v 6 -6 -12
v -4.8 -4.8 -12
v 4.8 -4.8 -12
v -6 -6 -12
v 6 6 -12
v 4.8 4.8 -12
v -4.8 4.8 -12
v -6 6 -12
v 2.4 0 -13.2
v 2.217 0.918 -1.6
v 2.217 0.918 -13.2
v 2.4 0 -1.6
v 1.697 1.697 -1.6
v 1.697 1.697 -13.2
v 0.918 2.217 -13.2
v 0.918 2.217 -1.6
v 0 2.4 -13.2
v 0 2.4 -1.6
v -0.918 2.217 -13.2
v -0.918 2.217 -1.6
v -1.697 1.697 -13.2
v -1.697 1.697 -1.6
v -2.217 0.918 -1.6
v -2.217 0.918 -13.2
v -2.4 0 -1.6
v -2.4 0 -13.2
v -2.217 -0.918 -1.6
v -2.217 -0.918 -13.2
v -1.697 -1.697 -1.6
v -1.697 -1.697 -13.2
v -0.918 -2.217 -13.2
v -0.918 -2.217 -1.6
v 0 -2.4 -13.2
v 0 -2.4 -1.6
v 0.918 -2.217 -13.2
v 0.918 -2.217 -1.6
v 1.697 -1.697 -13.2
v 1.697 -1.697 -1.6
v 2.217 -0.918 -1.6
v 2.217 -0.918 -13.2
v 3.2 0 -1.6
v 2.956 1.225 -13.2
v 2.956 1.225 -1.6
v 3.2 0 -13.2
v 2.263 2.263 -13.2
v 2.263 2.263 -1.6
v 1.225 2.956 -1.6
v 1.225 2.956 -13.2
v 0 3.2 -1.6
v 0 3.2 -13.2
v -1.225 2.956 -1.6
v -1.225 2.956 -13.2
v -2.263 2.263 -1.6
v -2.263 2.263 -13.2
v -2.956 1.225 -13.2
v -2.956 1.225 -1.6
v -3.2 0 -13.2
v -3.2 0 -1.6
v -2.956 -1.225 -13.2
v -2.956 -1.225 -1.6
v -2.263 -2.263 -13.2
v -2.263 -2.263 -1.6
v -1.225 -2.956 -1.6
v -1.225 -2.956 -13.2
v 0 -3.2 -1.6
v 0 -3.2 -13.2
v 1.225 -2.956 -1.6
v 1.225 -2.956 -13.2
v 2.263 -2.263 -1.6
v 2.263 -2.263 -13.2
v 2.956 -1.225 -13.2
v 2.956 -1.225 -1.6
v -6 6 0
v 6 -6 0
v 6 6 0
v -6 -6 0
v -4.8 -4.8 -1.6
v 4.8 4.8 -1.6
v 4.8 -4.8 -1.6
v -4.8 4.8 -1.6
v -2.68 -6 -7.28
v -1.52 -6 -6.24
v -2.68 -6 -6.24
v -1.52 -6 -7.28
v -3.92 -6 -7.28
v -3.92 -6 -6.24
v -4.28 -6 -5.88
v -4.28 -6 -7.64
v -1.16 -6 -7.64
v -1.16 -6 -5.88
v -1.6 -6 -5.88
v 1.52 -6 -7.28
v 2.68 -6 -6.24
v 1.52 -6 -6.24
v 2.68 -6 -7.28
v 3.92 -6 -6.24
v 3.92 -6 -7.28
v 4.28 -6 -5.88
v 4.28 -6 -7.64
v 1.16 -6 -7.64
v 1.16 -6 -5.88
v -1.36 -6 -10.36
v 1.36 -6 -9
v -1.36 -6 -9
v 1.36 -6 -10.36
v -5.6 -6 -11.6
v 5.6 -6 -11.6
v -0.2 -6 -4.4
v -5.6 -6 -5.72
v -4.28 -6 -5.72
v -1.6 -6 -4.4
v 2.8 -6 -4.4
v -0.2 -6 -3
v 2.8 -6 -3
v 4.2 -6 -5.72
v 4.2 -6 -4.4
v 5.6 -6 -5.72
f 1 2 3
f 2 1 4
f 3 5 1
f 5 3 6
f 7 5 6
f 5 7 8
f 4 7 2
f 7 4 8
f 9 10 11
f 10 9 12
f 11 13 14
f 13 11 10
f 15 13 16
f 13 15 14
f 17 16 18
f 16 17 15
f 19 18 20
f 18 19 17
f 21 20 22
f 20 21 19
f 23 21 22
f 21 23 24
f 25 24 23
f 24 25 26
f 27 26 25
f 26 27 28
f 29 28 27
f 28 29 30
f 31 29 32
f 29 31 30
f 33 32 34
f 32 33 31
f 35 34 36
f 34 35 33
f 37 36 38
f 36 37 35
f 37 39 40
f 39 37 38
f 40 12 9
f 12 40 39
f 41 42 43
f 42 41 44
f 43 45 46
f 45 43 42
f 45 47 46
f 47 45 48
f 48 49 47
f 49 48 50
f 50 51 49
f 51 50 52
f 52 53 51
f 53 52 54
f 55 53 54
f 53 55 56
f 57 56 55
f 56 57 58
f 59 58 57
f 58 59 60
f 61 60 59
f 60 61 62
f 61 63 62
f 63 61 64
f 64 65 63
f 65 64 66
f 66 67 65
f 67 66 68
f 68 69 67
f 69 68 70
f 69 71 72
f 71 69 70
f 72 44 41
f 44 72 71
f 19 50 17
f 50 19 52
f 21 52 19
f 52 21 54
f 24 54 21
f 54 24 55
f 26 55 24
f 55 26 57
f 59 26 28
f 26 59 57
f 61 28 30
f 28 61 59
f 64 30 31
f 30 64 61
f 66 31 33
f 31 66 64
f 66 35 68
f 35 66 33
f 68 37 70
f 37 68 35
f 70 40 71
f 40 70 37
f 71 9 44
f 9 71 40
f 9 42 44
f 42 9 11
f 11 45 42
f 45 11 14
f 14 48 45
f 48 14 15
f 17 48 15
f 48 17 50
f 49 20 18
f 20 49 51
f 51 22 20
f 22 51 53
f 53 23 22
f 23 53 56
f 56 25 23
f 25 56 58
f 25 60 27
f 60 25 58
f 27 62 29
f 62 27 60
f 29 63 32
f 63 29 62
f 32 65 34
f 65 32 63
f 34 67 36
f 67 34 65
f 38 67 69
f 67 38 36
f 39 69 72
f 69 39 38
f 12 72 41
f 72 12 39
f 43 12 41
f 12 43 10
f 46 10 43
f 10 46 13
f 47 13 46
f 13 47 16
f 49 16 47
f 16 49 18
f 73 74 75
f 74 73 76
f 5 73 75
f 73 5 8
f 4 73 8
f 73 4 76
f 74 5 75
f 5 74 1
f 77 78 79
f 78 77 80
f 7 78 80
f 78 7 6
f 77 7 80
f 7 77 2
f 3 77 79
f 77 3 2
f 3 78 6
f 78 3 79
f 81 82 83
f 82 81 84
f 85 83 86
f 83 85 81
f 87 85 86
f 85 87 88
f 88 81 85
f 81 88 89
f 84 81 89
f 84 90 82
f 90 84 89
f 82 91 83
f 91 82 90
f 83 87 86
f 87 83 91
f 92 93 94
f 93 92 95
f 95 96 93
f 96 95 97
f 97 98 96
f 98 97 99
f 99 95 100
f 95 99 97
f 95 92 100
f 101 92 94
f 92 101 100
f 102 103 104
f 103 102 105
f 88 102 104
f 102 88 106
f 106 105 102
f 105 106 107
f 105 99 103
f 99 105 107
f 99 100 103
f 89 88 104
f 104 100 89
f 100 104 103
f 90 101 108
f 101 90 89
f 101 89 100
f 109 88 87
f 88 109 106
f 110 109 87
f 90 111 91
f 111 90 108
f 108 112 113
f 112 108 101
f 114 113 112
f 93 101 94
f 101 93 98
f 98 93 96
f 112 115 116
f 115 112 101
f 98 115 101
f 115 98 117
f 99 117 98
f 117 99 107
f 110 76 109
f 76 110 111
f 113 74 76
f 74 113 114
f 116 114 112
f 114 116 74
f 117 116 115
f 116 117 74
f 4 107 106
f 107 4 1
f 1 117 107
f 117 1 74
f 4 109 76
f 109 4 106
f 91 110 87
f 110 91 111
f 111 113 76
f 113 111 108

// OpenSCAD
// file: ../p/4-4ring3.scad
use <../lib.scad>
$fa=1; $fs=0.2;
function ldraw_lib__4_4ring3(realsolid=false) = [
// 0 Ring  3 x 1.0
// 0 Name: 4-4ring3.dat
// 0 Author: James Jessiman
// 0 !LDRAW_ORG Primitive UPDATE 2009-01
// 0 !LICENSE Licensed under CC BY 2.0 and CC BY 4.0 : see CAreadme.txt
// 
// 0 BFC CERTIFY CCW
  [0,"BFC","CERTIFY"],
  [0,"BFC","CCW"],
// 
// 0 !HISTORY 1998-12-15 [PTadmin] Official Update 1998-10
// 0 !HISTORY 2002-04-05 [hafhead] Added BFC statement
// 0 !HISTORY 2002-04-25 [PTadmin] Official Update 2002-02
// 0 !HISTORY 2007-06-24 [PTadmin] Header formatted for Contributor Agreement
// 0 !HISTORY 2008-07-01 [PTadmin] Official Update 2008-01
// 0 !HISTORY 2008-08-26 [cwdee] Switch polygon winding and rename
// 0 !HISTORY 2009-05-02 [PTadmin] Official Update 2009-01
// 
// 
// 4 16 -1.5308 0 3.6956 -1.1481 0 2.7717 0 0 3 0 0 4
  [4,16,-1.5308,0,3.6956,-1.1481,0,2.7717,0,0,3,0,0,4],
// 4 16 -2.8284 0 2.8284 -2.1213 0 2.1213 -1.1481 0 2.7717 -1.5308 0 3.6956
  [4,16,-2.8284,0,2.8284,-2.1213,0,2.1213,-1.1481,0,2.7717,-1.5308,0,3.6956],
// 4 16 -3.6956 0 1.5308 -2.7717 0 1.1481 -2.1213 0 2.1213 -2.8284 0 2.8284
  [4,16,-3.6956,0,1.5308,-2.7717,0,1.1481,-2.1213,0,2.1213,-2.8284,0,2.8284],
// 4 16 -4 0 0 -3 0 0 -2.7717 0 1.1481 -3.6956 0 1.5308
  [4,16,-4,0,0,-3,0,0,-2.7717,0,1.1481,-3.6956,0,1.5308],
// 4 16 -3.6956 0 -1.5308 -2.7717 0 -1.1481 -3 0 0 -4 0 0
  [4,16,-3.6956,0,-1.5308,-2.7717,0,-1.1481,-3,0,0,-4,0,0],
// 4 16 -2.8284 0 -2.8284 -2.1213 0 -2.1213 -2.7717 0 -1.1481 -3.6956 0 -1.5308
  [4,16,-2.8284,0,-2.8284,-2.1213,0,-2.1213,-2.7717,0,-1.1481,-3.6956,0,-1.5308],
// 4 16 -1.5308 0 -3.6956 -1.1481 0 -2.7717 -2.1213 0 -2.1213 -2.8284 0 -2.8284
  [4,16,-1.5308,0,-3.6956,-1.1481,0,-2.7717,-2.1213,0,-2.1213,-2.8284,0,-2.8284],
// 4 16 0 0 -4 0 0 -3 -1.1481 0 -2.7717 -1.5308 0 -3.6956
  [4,16,0,0,-4,0,0,-3,-1.1481,0,-2.7717,-1.5308,0,-3.6956],
// 4 16 1.5308 0 -3.6956 1.1481 0 -2.7717 0 0 -3 0 0 -4
  [4,16,1.5308,0,-3.6956,1.1481,0,-2.7717,0,0,-3,0,0,-4],
// 4 16 2.8284 0 -2.8284 2.1213 0 -2.1213 1.1481 0 -2.7717 1.5308 0 -3.6956
  [4,16,2.8284,0,-2.8284,2.1213,0,-2.1213,1.1481,0,-2.7717,1.5308,0,-3.6956],
// 4 16 3.6956 0 -1.5308 2.7717 0 -1.1481 2.1213 0 -2.1213 2.8284 0 -2.8284
  [4,16,3.6956,0,-1.5308,2.7717,0,-1.1481,2.1213,0,-2.1213,2.8284,0,-2.8284],
// 4 16 4 0 0 3 0 0 2.7717 0 -1.1481 3.6956 0 -1.5308
  [4,16,4,0,0,3,0,0,2.7717,0,-1.1481,3.6956,0,-1.5308],
// 4 16 3.6956 0 1.5308 2.7717 0 1.1481 3 0 0 4 0 0
  [4,16,3.6956,0,1.5308,2.7717,0,1.1481,3,0,0,4,0,0],
// 4 16 2.8284 0 2.8284 2.1213 0 2.1213 2.7717 0 1.1481 3.6956 0 1.5308
  [4,16,2.8284,0,2.8284,2.1213,0,2.1213,2.7717,0,1.1481,3.6956,0,1.5308],
// 4 16 1.5308 0 3.6956 1.1481 0 2.7717 2.1213 0 2.1213 2.8284 0 2.8284
  [4,16,1.5308,0,3.6956,1.1481,0,2.7717,2.1213,0,2.1213,2.8284,0,2.8284],
// 4 16 0 0 4 0 0 3 1.1481 0 2.7717 1.5308 0 3.6956
  [4,16,0,0,4,0,0,3,1.1481,0,2.7717,1.5308,0,3.6956],
// 0
];
module ldraw_lib__4_4ring3(step=0, col=false, unit=2/5, alt=false, line=0.2, solid=!$preview)
    makepoly(ldraw_lib__4_4ring3(solid), step=step, col=col, unit=unit, alt=alt, line=line, solid=solid);
ldraw_lib__4_4ring3(line=0.2);
// file: ../p/4-4edge.scad
use <../lib.scad>
function ldraw_lib__4_4edge() = [
// 0 Circle 1.0
// 0 Name: 4-4edge.dat
// 0 Author: James Jessiman
// 0 !LDRAW_ORG Primitive UPDATE 2017-01
// 0 !LICENSE Licensed under CC BY 2.0 and CC BY 4.0 : see CAreadme.txt
// 
// 0 BFC CERTIFY CCW
  [0,"BFC","CERTIFY"],
  [0,"BFC","CCW"],
// 
// 0 !HISTORY 1998-12-15 [PTadmin] Official Update 1998-10
// 0 !HISTORY 2005-12-28 [PTadmin] Official Update 2005-01
// 0 !HISTORY 2007-06-24 [PTadmin] Header formatted for Contributor Agreement
// 0 !HISTORY 2008-07-01 [PTadmin] Official Update 2008-01
// 0 !HISTORY 2017-01-15 [Steffen] BFCed
// 0 !HISTORY 2017-12-30 [PTadmin] Official Update 2017-01
// 
// 
// 2 24 1 0 0 0.9239 0 0.3827
  [2,24,1,0,0,0.9239,0,0.3827],
// 2 24 0.9239 0 0.3827 0.7071 0 0.7071
  [2,24,0.9239,0,0.3827,0.7071,0,0.7071],
// 2 24 0.7071 0 0.7071 0.3827 0 0.9239
  [2,24,0.7071,0,0.7071,0.3827,0,0.9239],
// 2 24 0.3827 0 0.9239 0 0 1
  [2,24,0.3827,0,0.9239,0,0,1],
// 2 24 0 0 1 -0.3827 0 0.9239
  [2,24,0,0,1,-0.3827,0,0.9239],
// 2 24 -0.3827 0 0.9239 -0.7071 0 0.7071
  [2,24,-0.3827,0,0.9239,-0.7071,0,0.7071],
// 2 24 -0.7071 0 0.7071 -0.9239 0 0.3827
  [2,24,-0.7071,0,0.7071,-0.9239,0,0.3827],
// 2 24 -0.9239 0 0.3827 -1 0 -0
  [2,24,-0.9239,0,0.3827,-1,0,-0],
// 2 24 -1 0 -0 -0.9239 0 -0.3827
  [2,24,-1,0,-0,-0.9239,0,-0.3827],
// 2 24 -0.9239 0 -0.3827 -0.7071 0 -0.7071
  [2,24,-0.9239,0,-0.3827,-0.7071,0,-0.7071],
// 2 24 -0.7071 0 -0.7071 -0.3827 0 -0.9239
  [2,24,-0.7071,0,-0.7071,-0.3827,0,-0.9239],
// 2 24 -0.3827 0 -0.9239 0 0 -1
  [2,24,-0.3827,0,-0.9239,0,0,-1],
// 2 24 0 0 -1 0.3827 0 -0.9239
  [2,24,0,0,-1,0.3827,0,-0.9239],
// 2 24 0.3827 0 -0.9239 0.7071 0 -0.7071
  [2,24,0.3827,0,-0.9239,0.7071,0,-0.7071],
// 2 24 0.7071 0 -0.7071 0.9239 0 -0.3827
  [2,24,0.7071,0,-0.7071,0.9239,0,-0.3827],
// 2 24 0.9239 0 -0.3827 1 0 0
  [2,24,0.9239,0,-0.3827,1,0,0],
];
module ldraw_lib__4_4edge(step=0, col=false, unit=2/5, alt=false, line=0.2, solid=!$preview)
    makepoly(ldraw_lib__4_4edge(), step=step, col=col, unit=unit, alt=alt, line=line, solid=solid);
ldraw_lib__4_4edge(line=0.2);
// file: ../p/4-4cyli.scad
use <../lib.scad>
$fa=1; $fs=0.2;
function ldraw_lib__4_4cyli(realsolid=false) = [
// 0 Cylinder 1.0
// 0 Name: 4-4cyli.dat
// 0 Author: James Jessiman
// 0 !LDRAW_ORG Primitive UPDATE 2005-01
// 0 !LICENSE Licensed under CC BY 2.0 and CC BY 4.0 : see CAreadme.txt
// 
// 0 BFC CERTIFY CCW
  [0,"BFC","CERTIFY"],
  [0,"BFC","CCW"],
// 
// 0 !HISTORY 1998-12-15 [PTadmin] Official Update 1998-10
// 0 !HISTORY 2002-03-23 [sbliss] Added BFC statement; merged headers from files in distributions LDraw 0.27 and Complete.
// 0 !HISTORY 2002-04-25 [PTadmin] Official Update 2002-02
// 0 !HISTORY 2004-12-14 [guyvivan] BFC CCW
// 0 !HISTORY 2005-12-28 [PTadmin] Official Update 2005-01
// 0 !HISTORY 2007-06-24 [PTadmin] Header formatted for Contributor Agreement
// 0 !HISTORY 2008-07-01 [PTadmin] Official Update 2008-01
// 
// 
// 4 16 1 1 0 0.9239 1 0.3827 0.9239 0 0.3827 1 0 0
  [4,16,1,1,0,0.9239,1,0.3827,0.9239,0,0.3827,1,0,0],
// 5 24 1 0 0 1 1 0 0.9239 0 0.3827 0.9239 0 -0.3827
  [5,24,1,0,0,1,1,0,0.9239,0,0.3827,0.9239,0,-0.3827],
// 4 16 0.9239 1 0.3827 0.7071 1 0.7071 0.7071 0 0.7071 0.9239 0 0.3827
  [4,16,0.9239,1,0.3827,0.7071,1,0.7071,0.7071,0,0.7071,0.9239,0,0.3827],
// 5 24 0.9239 0 0.3827 0.9239 1 0.3827 0.7071 0 0.7071 1 0 0
  [5,24,0.9239,0,0.3827,0.9239,1,0.3827,0.7071,0,0.7071,1,0,0],
// 4 16 0.7071 1 0.7071 0.3827 1 0.9239 0.3827 0 0.9239 0.7071 0 0.7071
  [4,16,0.7071,1,0.7071,0.3827,1,0.9239,0.3827,0,0.9239,0.7071,0,0.7071],
// 5 24 0.7071 0 0.7071 0.7071 1 0.7071 0.3827 0 0.9239 0.9239 0 0.3827
  [5,24,0.7071,0,0.7071,0.7071,1,0.7071,0.3827,0,0.9239,0.9239,0,0.3827],
// 4 16 0.3827 1 0.9239 0 1 1 0 0 1 0.3827 0 0.9239
  [4,16,0.3827,1,0.9239,0,1,1,0,0,1,0.3827,0,0.9239],
// 5 24 0.3827 0 0.9239 0.3827 1 0.9239 0 0 1 0.7071 0 0.7071
  [5,24,0.3827,0,0.9239,0.3827,1,0.9239,0,0,1,0.7071,0,0.7071],
// 4 16 0 1 1 -0.3827 1 0.9239 -0.3827 0 0.9239 0 0 1
  [4,16,0,1,1,-0.3827,1,0.9239,-0.3827,0,0.9239,0,0,1],
// 5 24 0 0 1 0 1 1 -0.3827 0 0.9239 0.3827 0 0.9239
  [5,24,0,0,1,0,1,1,-0.3827,0,0.9239,0.3827,0,0.9239],
// 4 16 -0.3827 1 0.9239 -0.7071 1 0.7071 -0.7071 0 0.7071 -0.3827 0 0.9239
  [4,16,-0.3827,1,0.9239,-0.7071,1,0.7071,-0.7071,0,0.7071,-0.3827,0,0.9239],
// 5 24 -0.3827 0 0.9239 -0.3827 1 0.9239 -0.7071 0 0.7071 0 0 1
  [5,24,-0.3827,0,0.9239,-0.3827,1,0.9239,-0.7071,0,0.7071,0,0,1],
// 4 16 -0.7071 1 0.7071 -0.9239 1 0.3827 -0.9239 0 0.3827 -0.7071 0 0.7071
  [4,16,-0.7071,1,0.7071,-0.9239,1,0.3827,-0.9239,0,0.3827,-0.7071,0,0.7071],
// 5 24 -0.7071 0 0.7071 -0.7071 1 0.7071 -0.9239 0 0.3827 -0.3827 0 0.9239
  [5,24,-0.7071,0,0.7071,-0.7071,1,0.7071,-0.9239,0,0.3827,-0.3827,0,0.9239],
// 4 16 -0.9239 1 0.3827 -1 1 0 -1 0 0 -0.9239 0 0.3827
  [4,16,-0.9239,1,0.3827,-1,1,0,-1,0,0,-0.9239,0,0.3827],
// 5 24 -0.9239 0 0.3827 -0.9239 1 0.3827 -1 0 0 -0.7071 0 0.7071
  [5,24,-0.9239,0,0.3827,-0.9239,1,0.3827,-1,0,0,-0.7071,0,0.7071],
// 4 16 -1 1 0 -0.9239 1 -0.3827 -0.9239 0 -0.3827 -1 0 0
  [4,16,-1,1,0,-0.9239,1,-0.3827,-0.9239,0,-0.3827,-1,0,0],
// 5 24 -1 0 0 -1 1 0 -0.9239 0 -0.3827 -0.9239 0 0.3827
  [5,24,-1,0,0,-1,1,0,-0.9239,0,-0.3827,-0.9239,0,0.3827],
// 4 16 -0.9239 1 -0.3827 -0.7071 1 -0.7071 -0.7071 0 -0.7071 -0.9239 0 -0.3827
  [4,16,-0.9239,1,-0.3827,-0.7071,1,-0.7071,-0.7071,0,-0.7071,-0.9239,0,-0.3827],
// 5 24 -0.9239 0 -0.3827 -0.9239 1 -0.3827 -0.7071 0 -0.7071 -1 0 0
  [5,24,-0.9239,0,-0.3827,-0.9239,1,-0.3827,-0.7071,0,-0.7071,-1,0,0],
// 4 16 -0.7071 1 -0.7071 -0.3827 1 -0.9239 -0.3827 0 -0.9239 -0.7071 0 -0.7071
  [4,16,-0.7071,1,-0.7071,-0.3827,1,-0.9239,-0.3827,0,-0.9239,-0.7071,0,-0.7071],
// 5 24 -0.7071 0 -0.7071 -0.7071 1 -0.7071 -0.3827 0 -0.9239 -0.9239 0 -0.3827
  [5,24,-0.7071,0,-0.7071,-0.7071,1,-0.7071,-0.3827,0,-0.9239,-0.9239,0,-0.3827],
// 4 16 -0.3827 1 -0.9239 0 1 -1 0 0 -1 -0.3827 0 -0.9239
  [4,16,-0.3827,1,-0.9239,0,1,-1,0,0,-1,-0.3827,0,-0.9239],
// 5 24 -0.3827 0 -0.9239 -0.3827 1 -0.9239 0 0 -1 -0.7071 0 -0.7071
  [5,24,-0.3827,0,-0.9239,-0.3827,1,-0.9239,0,0,-1,-0.7071,0,-0.7071],
// 4 16 0 1 -1 0.3827 1 -0.9239 0.3827 0 -0.9239 0 0 -1
  [4,16,0,1,-1,0.3827,1,-0.9239,0.3827,0,-0.9239,0,0,-1],
// 5 24 0 0 -1 0 1 -1 0.3827 0 -0.9239 -0.3827 0 -0.9239
  [5,24,0,0,-1,0,1,-1,0.3827,0,-0.9239,-0.3827,0,-0.9239],
// 4 16 0.3827 1 -0.9239 0.7071 1 -0.7071 0.7071 0 -0.7071 0.3827 0 -0.9239
  [4,16,0.3827,1,-0.9239,0.7071,1,-0.7071,0.7071,0,-0.7071,0.3827,0,-0.9239],
// 5 24 0.3827 0 -0.9239 0.3827 1 -0.9239 0.7071 0 -0.7071 0 0 -1
  [5,24,0.3827,0,-0.9239,0.3827,1,-0.9239,0.7071,0,-0.7071,0,0,-1],
// 4 16 0.7071 1 -0.7071 0.9239 1 -0.3827 0.9239 0 -0.3827 0.7071 0 -0.7071
  [4,16,0.7071,1,-0.7071,0.9239,1,-0.3827,0.9239,0,-0.3827,0.7071,0,-0.7071],
// 5 24 0.7071 0 -0.7071 0.7071 1 -0.7071 0.9239 0 -0.3827 0.3827 0 -0.9239
  [5,24,0.7071,0,-0.7071,0.7071,1,-0.7071,0.9239,0,-0.3827,0.3827,0,-0.9239],
// 4 16 0.9239 1 -0.3827 1 1 0 1 0 0 0.9239 0 -0.3827
  [4,16,0.9239,1,-0.3827,1,1,0,1,0,0,0.9239,0,-0.3827],
// 5 24 0.9239 0 -0.3827 0.9239 1 -0.3827 1 0 0 0.7071 0 -0.7071
  [5,24,0.9239,0,-0.3827,0.9239,1,-0.3827,1,0,0,0.7071,0,-0.7071],
// 0
];
module ldraw_lib__4_4cyli(step=0, col=false, unit=2/5, alt=false, line=0.2, solid=!$preview)
    makepoly(ldraw_lib__4_4cyli(solid), step=step, col=col, unit=unit, alt=alt, line=line, solid=solid);
ldraw_lib__4_4cyli(line=0.2);
// file: ../p/stud4.scad
use <../lib.scad>
use <4-4cyli.scad>
use <4-4edge.scad>
use <4-4ring3.scad>
function ldraw_lib__stud4() = [
// 0 Stud Tube Open
// 0 Name: stud4.dat
// 0 Author: James Jessiman
// 0 !LDRAW_ORG Primitive UPDATE 2009-02
// 0 !LICENSE Licensed under CC BY 4.0 : see CAreadme.txt
// 
// 0 BFC CERTIFY CCW
  [0,"BFC","CERTIFY"],
  [0,"BFC","CCW"],
// 
// 0 !HISTORY 1999-07-05 [PTadmin] Official Update 1999-05
// 0 !HISTORY 2002-04-04 [sbliss] Modified for BFC compliance
// 0 !HISTORY 2002-04-25 [PTadmin] Official Update 2002-02
// 0 !HISTORY 2007-06-24 [PTadmin] Header formatted for Contributor Agreement
// 0 !HISTORY 2008-07-01 [PTadmin] Official Update 2008-01
// 0 !HISTORY 2009-06-21 [cwdee] Update ring references to 4-4ring
// 0 !HISTORY 2009-09-03 [PTadmin] Official Update 2009-02
// 
// 
// 1 16 0 -4 0 6 0 0 0 1 0 0 0 6 4-4edge.dat
  [1,16,0,-4,0,6,0,0,0,1,0,0,0,6, ldraw_lib__4_4edge()],
// 1 16 0 -4 0 8 0 0 0 1 0 0 0 8 4-4edge.dat
  [1,16,0,-4,0,8,0,0,0,1,0,0,0,8, ldraw_lib__4_4edge()],
// 1 16 0 0 0 6 0 0 0 1 0 0 0 6 4-4edge.dat
  [1,16,0,0,0,6,0,0,0,1,0,0,0,6, ldraw_lib__4_4edge()],
// 1 16 0 0 0 8 0 0 0 1 0 0 0 8 4-4edge.dat
  [1,16,0,0,0,8,0,0,0,1,0,0,0,8, ldraw_lib__4_4edge()],
// 0 BFC INVERTNEXT
  [0,"BFC","INVERTNEXT"],
// 1 16 0 -4 0 6 0 0 0 4 0 0 0 6 4-4cyli.dat
  [1,16,0,-4,0,6,0,0,0,4,0,0,0,6, ldraw_lib__4_4cyli()],
// 1 16 0 -4 0 8 0 0 0 4 0 0 0 8 4-4cyli.dat
  [1,16,0,-4,0,8,0,0,0,4,0,0,0,8, ldraw_lib__4_4cyli()],
// 1 16 0 -4 0 2 0 0 0 1 0 0 0 2 4-4ring3.dat
  [1,16,0,-4,0,2,0,0,0,1,0,0,0,2, ldraw_lib__4_4ring3()],
  [-1,16,0,0,0,2,0,0,0,-1,0,0,0,2, ldraw_lib__4_4ring3()],
// 0
];
module ldraw_lib__stud4(step=0, col=false, unit=2/5, alt=false, line=0.2, solid=!$preview)
    makepoly(ldraw_lib__stud4(), step=step, col=col, unit=unit, alt=alt, line=line, solid=solid);
ldraw_lib__stud4(line=0.2);
// file: ../p/box5.scad
use <../lib.scad>
function ldraw_lib__box5() = [
// 0 Box with 5 Faces and All Edges
// 0 Name: box5.dat
// 0 Author: James Jessiman
// 0 !LDRAW_ORG Primitive UPDATE 2012-01
// 0 !LICENSE Licensed under CC BY 2.0 and CC BY 4.0 : see CAreadme.txt
// 
// 0 BFC CERTIFY CCW
  [0,"BFC","CERTIFY"],
  [0,"BFC","CCW"],
// 
// 0 !HISTORY 2002-04-03 [sbliss] Modified for BFC compliance
// 0 !HISTORY 2002-04-25 [PTadmin] Official Update 2002-02
// 0 !HISTORY 2007-06-24 [PTadmin] Header formatted for Contributor Agreement
// 0 !HISTORY 2008-07-01 [PTadmin] Official Update 2008-01
// 0 !HISTORY 2012-02-16 [Philo] Changed to CCW
// 0 !HISTORY 2012-03-30 [PTadmin] Official Update 2012-01
// 
// 
// 2 24 1 1 1 -1 1 1
  [2,24,1,1,1,-1,1,1],
// 2 24 -1 1 1 -1 1 -1
  [2,24,-1,1,1,-1,1,-1],
// 2 24 -1 1 -1 1 1 -1
  [2,24,-1,1,-1,1,1,-1],
// 2 24 1 1 -1 1 1 1
  [2,24,1,1,-1,1,1,1],
// 2 24 1 0 1 -1 0 1
  [2,24,1,0,1,-1,0,1],
// 2 24 -1 0 1 -1 0 -1
  [2,24,-1,0,1,-1,0,-1],
// 2 24 -1 0 -1 1 0 -1
  [2,24,-1,0,-1,1,0,-1],
// 2 24 1 0 -1 1 0 1
  [2,24,1,0,-1,1,0,1],
// 2 24 1 0 1 1 1 1
  [2,24,1,0,1,1,1,1],
// 2 24 -1 0 1 -1 1 1
  [2,24,-1,0,1,-1,1,1],
// 2 24 1 0 -1 1 1 -1
  [2,24,1,0,-1,1,1,-1],
// 2 24 -1 0 -1 -1 1 -1
  [2,24,-1,0,-1,-1,1,-1],
// 4 16 -1 1 1 1 1 1 1 1 -1 -1 1 -1
  [4,16,-1,1,1,1,1,1,1,1,-1,-1,1,-1],
// 4 16 -1 1 1 -1 0 1 1 0 1 1 1 1
  [4,16,-1,1,1,-1,0,1,1,0,1,1,1,1],
// 4 16 -1 1 -1 -1 0 -1 -1 0 1 -1 1 1
  [4,16,-1,1,-1,-1,0,-1,-1,0,1,-1,1,1],
// 4 16 1 1 -1 1 0 -1 -1 0 -1 -1 1 -1
  [4,16,1,1,-1,1,0,-1,-1,0,-1,-1,1,-1],
// 4 16 1 1 1 1 0 1 1 0 -1 1 1 -1
  [4,16,1,1,1,1,0,1,1,0,-1,1,1,-1],
];
makepoly(ldraw_lib__box5(), line=0.2);
// file: ../p/box4t.scad
use <../lib.scad>
function ldraw_lib__box4t() = [
// 0 Box with 4 Adjacent Faces and All Edges
// 0 Name: box4t.dat
// 0 Author: Tore Eriksson [Tore_Eriksson]
// 0 !LDRAW_ORG Primitive UPDATE 2003-02
// 0 !LICENSE Licensed under CC BY 2.0 and CC BY 4.0 : see CAreadme.txt
// 
// 0 BFC CERTIFY CCW
  [0,"BFC","CERTIFY"],
  [0,"BFC","CCW"],
// 
// 0 !HISTORY 1997-09-29 [PTadmin] Official Update 1997-15
// 0 !HISTORY 2002-08-31 [izanette] Modified with WINDZ for BFC compliance
// 0 !HISTORY 2003-08-01 [PTadmin] Official Update 2003-02
// 0 !HISTORY 2007-06-24 [PTadmin] Header formatted for Contributor Agreement
// 0 !HISTORY 2008-07-01 [PTadmin] Official Update 2008-01
// 
// 
// 2 24 1 1 1 -1 1 1
  [2,24,1,1,1,-1,1,1],
// 2 24 -1 1 1 -1 1 -1
  [2,24,-1,1,1,-1,1,-1],
// 2 24 -1 1 -1 1 1 -1
  [2,24,-1,1,-1,1,1,-1],
// 2 24 1 1 -1 1 1 1
  [2,24,1,1,-1,1,1,1],
// 2 24 1 0 1 -1 0 1
  [2,24,1,0,1,-1,0,1],
// 2 24 -1 0 1 -1 0 -1
  [2,24,-1,0,1,-1,0,-1],
// 2 24 -1 0 -1 1 0 -1
  [2,24,-1,0,-1,1,0,-1],
// 2 24 1 0 -1 1 0 1
  [2,24,1,0,-1,1,0,1],
// 2 24 1 0 1 1 1 1
  [2,24,1,0,1,1,1,1],
// 2 24 -1 0 1 -1 1 1
  [2,24,-1,0,1,-1,1,1],
// 2 24 1 0 -1 1 1 -1
  [2,24,1,0,-1,1,1,-1],
// 2 24 -1 0 -1 -1 1 -1
  [2,24,-1,0,-1,-1,1,-1],
// 4 16 1 1 1 1 1 -1 -1 1 -1 -1 1 1
  [4,16,1,1,1,1,1,-1,-1,1,-1,-1,1,1],
// 4 16 1 1 1 -1 1 1 -1 0 1 1 0 1
  [4,16,1,1,1,-1,1,1,-1,0,1,1,0,1],
// 4 16 -1 1 1 -1 1 -1 -1 0 -1 -1 0 1
  [4,16,-1,1,1,-1,1,-1,-1,0,-1,-1,0,1],
// 0 4 16 -1 1 -1 -1 0 -1 1 0 -1 1 1 -1
// 4 16 1 1 -1 1 1 1 1 0 1 1 0 -1
  [4,16,1,1,-1,1,1,1,1,0,1,1,0,-1],
// 0
];
makepoly(ldraw_lib__box4t(), line=0.2);
// file: s/19729s01.scad
use <../../lib.scad>
use <../../p/box4t.scad>
use <../../p/box5.scad>
use <../../p/stud4.scad>
function ldraw_lib__s__19729s01() = [
// 0 ~Minifig Head Cuboid without Front Surface
// 0 Name: s\19729s01.dat
// 0 Author: Mark Kennedy [mkennedy]
// 0 !LDRAW_ORG Subpart UPDATE 2016-01
// 0 !LICENSE Licensed under CC BY 4.0 : see CAreadme.txt
// 
// 0 BFC CERTIFY CW
  [0,"BFC","CERTIFY"],
  [0,"BFC","CW"],
// 
// 0 !HISTORY 2016-03-18 {LEGO Digital Designer} Original part shape
// 0 !HISTORY 2016-03-28 [mkennedy] Primitive substitution
// 0 !HISTORY 2016-12-31 [PTadmin] Official Update 2016-01
// 
// 
// 4 16 15 30 -15 12 30 -12 -12 30 -12 -15 30 -15
  [4,16,15,30,-15,12,30,-12,-12,30,-12,-15,30,-15],
// 4 16 15 30 15 12 30 12 12 30 -12 15 30 -15
  [4,16,15,30,15,12,30,12,12,30,-12,15,30,-15],
// 4 16 -15 30 15 -12 30 12 12 30 12 15 30 15
  [4,16,-15,30,15,-12,30,12,12,30,12,15,30,15],
// 4 16 -15 30 -15 -12 30 -12 -12 30 12 -15 30 15
  [4,16,-15,30,-15,-12,30,-12,-12,30,12,-15,30,15],
// 0
// 1 16 0 4 0 1 0 0 0 -7.25 0 0 0 1 stud4.dat
  [1,16,0,4,0,1,0,0,0,-7.25,0,0,0,1, ldraw_lib__stud4()],
// 1 16 0 30 0 15 0 0 0 -30 0 0 0 15 box4t.dat
  [1,16,0,30,0,15,0,0,0,-30,0,0,0,15, ldraw_lib__box4t()],
// 0 BFC INVERTNEXT
  [0,"BFC","INVERTNEXT"],
// 1 16 0 30 0 12 0 0 0 -26 0 0 0 12 box5.dat
  [1,16,0,30,0,12,0,0,0,-26,0,0,0,12, ldraw_lib__box5()],
// 
];
module ldraw_lib__s__19729s01(step=0, col=false, unit=2/5, alt=false, line=0.2, solid=!$preview)
    makepoly(ldraw_lib__s__19729s01(), step=step, col=col, unit=unit, alt=alt, line=line, solid=solid);
ldraw_lib__s__19729s01(line=0.2);
// main file
use <../lib.scad>
use <s/19729s01.scad>
function ldraw_lib__19729p06() = [
// 0 Minifig Head Cuboid with Minecraft Alex Pattern
// 0 Name: 19729p06.dat
// 0 Author: Evert-Jan Boer [ejboer]
// 0 !LDRAW_ORG Part UPDATE 2024-04
// 0 !LICENSE Licensed under CC BY 4.0 : see CAreadme.txt
// 
// 0 BFC CERTIFY CCW
  [0,"BFC","CERTIFY"],
  [0,"BFC","CCW"],
// 
// 0 !KEYWORDS Bricklink 19729pb009, Rebrickable 19729pr0012, Set 21121, set 21140
// 0 !KEYWORDS set 21147, Set 21154, set 21161
// 
// 0 !HISTORY 2024-05-28 [OrionP] Official Update 2024-04
// 
// 
// 1 16 0 0 0 1 0 0 0 1 0 0 0 1 s\19729s01.dat
  [1,16,0,0,0,1,0,0,0,1,0,0,0,1, ldraw_lib__s__19729s01()],
// 4 2 -6.7 15.6 -15 -6.7 18.2 -15 -3.8 18.2 -15 -3.8 15.6 -15
  [4,2,-6.7,15.6,-15,-6.7,18.2,-15,-3.8,18.2,-15,-3.8,15.6,-15],
// 4 15 -9.8 18.2 -15 -6.7 18.2 -15 -6.7 15.6 -15 -9.8 15.6 -15
  [4,15,-9.8,18.2,-15,-6.7,18.2,-15,-6.7,15.6,-15,-9.8,15.6,-15],
// 4 308 -10.7 19.1 -15 -9.8 18.2 -15 -9.8 15.6 -15 -10.7 14.7 -15
  [4,308,-10.7,19.1,-15,-9.8,18.2,-15,-9.8,15.6,-15,-10.7,14.7,-15],
// 4 308 -9.8 18.2 -15 -10.7 19.1 -15 -2.9 19.1 -15 -6.7 18.2 -15
  [4,308,-9.8,18.2,-15,-10.7,19.1,-15,-2.9,19.1,-15,-6.7,18.2,-15],
// 3 308 -3.8 18.2 -15 -6.7 18.2 -15 -2.9 19.1 -15
  [3,308,-3.8,18.2,-15,-6.7,18.2,-15,-2.9,19.1,-15],
// 4 308 -2.9 14.7 -15 -3.8 15.6 -15 -3.8 18.2 -15 -2.9 19.1 -15
  [4,308,-2.9,14.7,-15,-3.8,15.6,-15,-3.8,18.2,-15,-2.9,19.1,-15],
// 4 308 -6.7 15.6 -15 -3.8 15.6 -15 -2.9 14.7 -15 -4 14.7 -15
  [4,308,-6.7,15.6,-15,-3.8,15.6,-15,-2.9,14.7,-15,-4,14.7,-15],
// 4 308 -10.7 14.7 -15 -9.8 15.6 -15 -6.7 15.6 -15 -4 14.7 -15
  [4,308,-10.7,14.7,-15,-9.8,15.6,-15,-6.7,15.6,-15,-4,14.7,-15],
// 4 2 3.8 18.2 -15 6.7 18.2 -15 6.7 15.6 -15 3.8 15.6 -15
  [4,2,3.8,18.2,-15,6.7,18.2,-15,6.7,15.6,-15,3.8,15.6,-15],
// 4 15 6.7 15.6 -15 6.7 18.2 -15 9.8 18.2 -15 9.8 15.6 -15
  [4,15,6.7,15.6,-15,6.7,18.2,-15,9.8,18.2,-15,9.8,15.6,-15],
// 4 308 9.8 15.6 -15 9.8 18.2 -15 10.7 19.1 -15 10.7 14.7 -15
  [4,308,9.8,15.6,-15,9.8,18.2,-15,10.7,19.1,-15,10.7,14.7,-15],
// 4 308 9.8 18.2 -15 6.7 18.2 -15 2.9 19.1 -15 10.7 19.1 -15
  [4,308,9.8,18.2,-15,6.7,18.2,-15,2.9,19.1,-15,10.7,19.1,-15],
// 3 308 6.7 18.2 -15 3.8 18.2 -15 2.9 19.1 -15
  [3,308,6.7,18.2,-15,3.8,18.2,-15,2.9,19.1,-15],
// 4 308 3.8 18.2 -15 3.8 15.6 -15 2.9 14.7 -15 2.9 19.1 -15
  [4,308,3.8,18.2,-15,3.8,15.6,-15,2.9,14.7,-15,2.9,19.1,-15],
// 4 92 -3.4 22.5 -15 -3.4 25.9 -15 3.4 25.9 -15 3.4 22.5 -15
  [4,92,-3.4,22.5,-15,-3.4,25.9,-15,3.4,25.9,-15,3.4,22.5,-15],
// 4 78 -3.4 25.9 -15 -3.4 22.5 -15 -10.7 19.1 -15 -14 29 -15
  [4,78,-3.4,25.9,-15,-3.4,22.5,-15,-10.7,19.1,-15,-14,29,-15],
// 4 78 -3.4 25.9 -15 -14 29 -15 14 29 -15 3.4 25.9 -15
  [4,78,-3.4,25.9,-15,-14,29,-15,14,29,-15,3.4,25.9,-15],
// 4 78 10.7 19.1 -15 3.4 22.5 -15 3.4 25.9 -15 14 29 -15
  [4,78,10.7,19.1,-15,3.4,22.5,-15,3.4,25.9,-15,14,29,-15],
// 3 78 10.7 19.1 -15 2.9 19.1 -15 3.4 22.5 -15
  [3,78,10.7,19.1,-15,2.9,19.1,-15,3.4,22.5,-15],
// 3 78 -2.9 19.1 -15 -10.7 19.1 -15 -3.4 22.5 -15
  [3,78,-2.9,19.1,-15,-10.7,19.1,-15,-3.4,22.5,-15],
// 4 78 2.9 19.1 -15 -2.9 19.1 -15 -3.4 22.5 -15 3.4 22.5 -15
  [4,78,2.9,19.1,-15,-2.9,19.1,-15,-3.4,22.5,-15,3.4,22.5,-15],
// 4 78 -.5 11 -15 -2.9 14.7 -15 -2.9 19.1 -15 2.9 14.7 -15
  [4,78,-.5,11,-15,-2.9,14.7,-15,-2.9,19.1,-15,2.9,14.7,-15],
// 3 78 2.9 14.7 -15 -2.9 19.1 -15 2.9 19.1 -15
  [3,78,2.9,14.7,-15,-2.9,19.1,-15,2.9,19.1,-15],
// 4 78 -10.7 19.1 -15 -10.7 14.7 -15 -14 14.3 -15 -14 29 -15
  [4,78,-10.7,19.1,-15,-10.7,14.7,-15,-14,14.3,-15,-14,29,-15],
// 3 78 -10.7 14.3 -15 -14 14.3 -15 -10.7 14.7 -15
  [3,78,-10.7,14.3,-15,-14,14.3,-15,-10.7,14.7,-15],
// 4 78 -.5 11 -15 -4 11 -15 -4 14.7 -15 -2.9 14.7 -15
  [4,78,-.5,11,-15,-4,11,-15,-4,14.7,-15,-2.9,14.7,-15],
// 4 78 2.9 14.7 -15 7 11 -15 -.5 7.5 -15 -.5 11 -15
  [4,78,2.9,14.7,-15,7,11,-15,-.5,7.5,-15,-.5,11,-15],
// 3 78 7 7.5 -15 -.5 7.5 -15 7 11 -15
  [3,78,7,7.5,-15,-.5,7.5,-15,7,11,-15],
// 4 308 10.7 14.7 -15 2.9 14.7 -15 3.8 15.6 -15 6.7 15.6 -15
  [4,308,10.7,14.7,-15,2.9,14.7,-15,3.8,15.6,-15,6.7,15.6,-15],
// 3 308 10.7 14.7 -15 6.7 15.6 -15 9.8 15.6 -15
  [3,308,10.7,14.7,-15,6.7,15.6,-15,9.8,15.6,-15],
// 4 78 10.5 11 -15 7 11 -15 2.9 14.7 -15 10.5 14.3 -15
  [4,78,10.5,11,-15,7,11,-15,2.9,14.7,-15,10.5,14.3,-15],
// 4 78 2.9 14.7 -15 10.7 14.7 -15 14 14.3 -15 10.5 14.3 -15
  [4,78,2.9,14.7,-15,10.7,14.7,-15,14,14.3,-15,10.5,14.3,-15],
// 4 78 14 29 -15 14 14.3 -15 10.7 14.7 -15 10.7 19.1 -15
  [4,78,14,29,-15,14,14.3,-15,10.7,14.7,-15,10.7,19.1,-15],
// 4 16 -14 14.3 -15 -10.7 14.3 -15 -4 11 -15 -15 0 -15
  [4,16,-14,14.3,-15,-10.7,14.3,-15,-4,11,-15,-15,0,-15],
// 4 16 15 0 -15 -15 0 -15 -.5 7.5 -15 7 7.5 -15
  [4,16,15,0,-15,-15,0,-15,-.5,7.5,-15,7,7.5,-15],
// 4 16 15 0 -15 7 7.5 -15 7 11 -15 10.5 11 -15
  [4,16,15,0,-15,7,7.5,-15,7,11,-15,10.5,11,-15],
// 4 16 15 0 -15 10.5 11 -15 10.5 14.3 -15 14 14.3 -15
  [4,16,15,0,-15,10.5,11,-15,10.5,14.3,-15,14,14.3,-15],
// 4 16 14 29 -15 -14 29 -15 -15 30 -15 15 30 -15
  [4,16,14,29,-15,-14,29,-15,-15,30,-15,15,30,-15],
// 4 16 14 29 -15 15 30 -15 15 0 -15 14 14.3 -15
  [4,16,14,29,-15,15,30,-15,15,0,-15,14,14.3,-15],
// 4 16 -15 0 -15 -15 30 -15 -14 29 -15 -14 14.3 -15
  [4,16,-15,0,-15,-15,30,-15,-14,29,-15,-14,14.3,-15],
// 4 16 -4 11 -15 -10.7 14.3 -15 -10.7 14.7 -15 -4 14.7 -15
  [4,16,-4,11,-15,-10.7,14.3,-15,-10.7,14.7,-15,-4,14.7,-15],
// 4 16 -15 0 -15 -4 11 -15 -.5 11 -15 -.5 7.5 -15
  [4,16,-15,0,-15,-4,11,-15,-.5,11,-15,-.5,7.5,-15],
];
module ldraw_lib__19729p06(step=0, col=false, unit=2/5, alt=false, line=0.2, solid=!$preview)
    makepoly(ldraw_lib__19729p06(), step=step, col=col, unit=unit, alt=alt, line=line, solid=solid);
ldraw_lib__19729p06(line=0.2);
